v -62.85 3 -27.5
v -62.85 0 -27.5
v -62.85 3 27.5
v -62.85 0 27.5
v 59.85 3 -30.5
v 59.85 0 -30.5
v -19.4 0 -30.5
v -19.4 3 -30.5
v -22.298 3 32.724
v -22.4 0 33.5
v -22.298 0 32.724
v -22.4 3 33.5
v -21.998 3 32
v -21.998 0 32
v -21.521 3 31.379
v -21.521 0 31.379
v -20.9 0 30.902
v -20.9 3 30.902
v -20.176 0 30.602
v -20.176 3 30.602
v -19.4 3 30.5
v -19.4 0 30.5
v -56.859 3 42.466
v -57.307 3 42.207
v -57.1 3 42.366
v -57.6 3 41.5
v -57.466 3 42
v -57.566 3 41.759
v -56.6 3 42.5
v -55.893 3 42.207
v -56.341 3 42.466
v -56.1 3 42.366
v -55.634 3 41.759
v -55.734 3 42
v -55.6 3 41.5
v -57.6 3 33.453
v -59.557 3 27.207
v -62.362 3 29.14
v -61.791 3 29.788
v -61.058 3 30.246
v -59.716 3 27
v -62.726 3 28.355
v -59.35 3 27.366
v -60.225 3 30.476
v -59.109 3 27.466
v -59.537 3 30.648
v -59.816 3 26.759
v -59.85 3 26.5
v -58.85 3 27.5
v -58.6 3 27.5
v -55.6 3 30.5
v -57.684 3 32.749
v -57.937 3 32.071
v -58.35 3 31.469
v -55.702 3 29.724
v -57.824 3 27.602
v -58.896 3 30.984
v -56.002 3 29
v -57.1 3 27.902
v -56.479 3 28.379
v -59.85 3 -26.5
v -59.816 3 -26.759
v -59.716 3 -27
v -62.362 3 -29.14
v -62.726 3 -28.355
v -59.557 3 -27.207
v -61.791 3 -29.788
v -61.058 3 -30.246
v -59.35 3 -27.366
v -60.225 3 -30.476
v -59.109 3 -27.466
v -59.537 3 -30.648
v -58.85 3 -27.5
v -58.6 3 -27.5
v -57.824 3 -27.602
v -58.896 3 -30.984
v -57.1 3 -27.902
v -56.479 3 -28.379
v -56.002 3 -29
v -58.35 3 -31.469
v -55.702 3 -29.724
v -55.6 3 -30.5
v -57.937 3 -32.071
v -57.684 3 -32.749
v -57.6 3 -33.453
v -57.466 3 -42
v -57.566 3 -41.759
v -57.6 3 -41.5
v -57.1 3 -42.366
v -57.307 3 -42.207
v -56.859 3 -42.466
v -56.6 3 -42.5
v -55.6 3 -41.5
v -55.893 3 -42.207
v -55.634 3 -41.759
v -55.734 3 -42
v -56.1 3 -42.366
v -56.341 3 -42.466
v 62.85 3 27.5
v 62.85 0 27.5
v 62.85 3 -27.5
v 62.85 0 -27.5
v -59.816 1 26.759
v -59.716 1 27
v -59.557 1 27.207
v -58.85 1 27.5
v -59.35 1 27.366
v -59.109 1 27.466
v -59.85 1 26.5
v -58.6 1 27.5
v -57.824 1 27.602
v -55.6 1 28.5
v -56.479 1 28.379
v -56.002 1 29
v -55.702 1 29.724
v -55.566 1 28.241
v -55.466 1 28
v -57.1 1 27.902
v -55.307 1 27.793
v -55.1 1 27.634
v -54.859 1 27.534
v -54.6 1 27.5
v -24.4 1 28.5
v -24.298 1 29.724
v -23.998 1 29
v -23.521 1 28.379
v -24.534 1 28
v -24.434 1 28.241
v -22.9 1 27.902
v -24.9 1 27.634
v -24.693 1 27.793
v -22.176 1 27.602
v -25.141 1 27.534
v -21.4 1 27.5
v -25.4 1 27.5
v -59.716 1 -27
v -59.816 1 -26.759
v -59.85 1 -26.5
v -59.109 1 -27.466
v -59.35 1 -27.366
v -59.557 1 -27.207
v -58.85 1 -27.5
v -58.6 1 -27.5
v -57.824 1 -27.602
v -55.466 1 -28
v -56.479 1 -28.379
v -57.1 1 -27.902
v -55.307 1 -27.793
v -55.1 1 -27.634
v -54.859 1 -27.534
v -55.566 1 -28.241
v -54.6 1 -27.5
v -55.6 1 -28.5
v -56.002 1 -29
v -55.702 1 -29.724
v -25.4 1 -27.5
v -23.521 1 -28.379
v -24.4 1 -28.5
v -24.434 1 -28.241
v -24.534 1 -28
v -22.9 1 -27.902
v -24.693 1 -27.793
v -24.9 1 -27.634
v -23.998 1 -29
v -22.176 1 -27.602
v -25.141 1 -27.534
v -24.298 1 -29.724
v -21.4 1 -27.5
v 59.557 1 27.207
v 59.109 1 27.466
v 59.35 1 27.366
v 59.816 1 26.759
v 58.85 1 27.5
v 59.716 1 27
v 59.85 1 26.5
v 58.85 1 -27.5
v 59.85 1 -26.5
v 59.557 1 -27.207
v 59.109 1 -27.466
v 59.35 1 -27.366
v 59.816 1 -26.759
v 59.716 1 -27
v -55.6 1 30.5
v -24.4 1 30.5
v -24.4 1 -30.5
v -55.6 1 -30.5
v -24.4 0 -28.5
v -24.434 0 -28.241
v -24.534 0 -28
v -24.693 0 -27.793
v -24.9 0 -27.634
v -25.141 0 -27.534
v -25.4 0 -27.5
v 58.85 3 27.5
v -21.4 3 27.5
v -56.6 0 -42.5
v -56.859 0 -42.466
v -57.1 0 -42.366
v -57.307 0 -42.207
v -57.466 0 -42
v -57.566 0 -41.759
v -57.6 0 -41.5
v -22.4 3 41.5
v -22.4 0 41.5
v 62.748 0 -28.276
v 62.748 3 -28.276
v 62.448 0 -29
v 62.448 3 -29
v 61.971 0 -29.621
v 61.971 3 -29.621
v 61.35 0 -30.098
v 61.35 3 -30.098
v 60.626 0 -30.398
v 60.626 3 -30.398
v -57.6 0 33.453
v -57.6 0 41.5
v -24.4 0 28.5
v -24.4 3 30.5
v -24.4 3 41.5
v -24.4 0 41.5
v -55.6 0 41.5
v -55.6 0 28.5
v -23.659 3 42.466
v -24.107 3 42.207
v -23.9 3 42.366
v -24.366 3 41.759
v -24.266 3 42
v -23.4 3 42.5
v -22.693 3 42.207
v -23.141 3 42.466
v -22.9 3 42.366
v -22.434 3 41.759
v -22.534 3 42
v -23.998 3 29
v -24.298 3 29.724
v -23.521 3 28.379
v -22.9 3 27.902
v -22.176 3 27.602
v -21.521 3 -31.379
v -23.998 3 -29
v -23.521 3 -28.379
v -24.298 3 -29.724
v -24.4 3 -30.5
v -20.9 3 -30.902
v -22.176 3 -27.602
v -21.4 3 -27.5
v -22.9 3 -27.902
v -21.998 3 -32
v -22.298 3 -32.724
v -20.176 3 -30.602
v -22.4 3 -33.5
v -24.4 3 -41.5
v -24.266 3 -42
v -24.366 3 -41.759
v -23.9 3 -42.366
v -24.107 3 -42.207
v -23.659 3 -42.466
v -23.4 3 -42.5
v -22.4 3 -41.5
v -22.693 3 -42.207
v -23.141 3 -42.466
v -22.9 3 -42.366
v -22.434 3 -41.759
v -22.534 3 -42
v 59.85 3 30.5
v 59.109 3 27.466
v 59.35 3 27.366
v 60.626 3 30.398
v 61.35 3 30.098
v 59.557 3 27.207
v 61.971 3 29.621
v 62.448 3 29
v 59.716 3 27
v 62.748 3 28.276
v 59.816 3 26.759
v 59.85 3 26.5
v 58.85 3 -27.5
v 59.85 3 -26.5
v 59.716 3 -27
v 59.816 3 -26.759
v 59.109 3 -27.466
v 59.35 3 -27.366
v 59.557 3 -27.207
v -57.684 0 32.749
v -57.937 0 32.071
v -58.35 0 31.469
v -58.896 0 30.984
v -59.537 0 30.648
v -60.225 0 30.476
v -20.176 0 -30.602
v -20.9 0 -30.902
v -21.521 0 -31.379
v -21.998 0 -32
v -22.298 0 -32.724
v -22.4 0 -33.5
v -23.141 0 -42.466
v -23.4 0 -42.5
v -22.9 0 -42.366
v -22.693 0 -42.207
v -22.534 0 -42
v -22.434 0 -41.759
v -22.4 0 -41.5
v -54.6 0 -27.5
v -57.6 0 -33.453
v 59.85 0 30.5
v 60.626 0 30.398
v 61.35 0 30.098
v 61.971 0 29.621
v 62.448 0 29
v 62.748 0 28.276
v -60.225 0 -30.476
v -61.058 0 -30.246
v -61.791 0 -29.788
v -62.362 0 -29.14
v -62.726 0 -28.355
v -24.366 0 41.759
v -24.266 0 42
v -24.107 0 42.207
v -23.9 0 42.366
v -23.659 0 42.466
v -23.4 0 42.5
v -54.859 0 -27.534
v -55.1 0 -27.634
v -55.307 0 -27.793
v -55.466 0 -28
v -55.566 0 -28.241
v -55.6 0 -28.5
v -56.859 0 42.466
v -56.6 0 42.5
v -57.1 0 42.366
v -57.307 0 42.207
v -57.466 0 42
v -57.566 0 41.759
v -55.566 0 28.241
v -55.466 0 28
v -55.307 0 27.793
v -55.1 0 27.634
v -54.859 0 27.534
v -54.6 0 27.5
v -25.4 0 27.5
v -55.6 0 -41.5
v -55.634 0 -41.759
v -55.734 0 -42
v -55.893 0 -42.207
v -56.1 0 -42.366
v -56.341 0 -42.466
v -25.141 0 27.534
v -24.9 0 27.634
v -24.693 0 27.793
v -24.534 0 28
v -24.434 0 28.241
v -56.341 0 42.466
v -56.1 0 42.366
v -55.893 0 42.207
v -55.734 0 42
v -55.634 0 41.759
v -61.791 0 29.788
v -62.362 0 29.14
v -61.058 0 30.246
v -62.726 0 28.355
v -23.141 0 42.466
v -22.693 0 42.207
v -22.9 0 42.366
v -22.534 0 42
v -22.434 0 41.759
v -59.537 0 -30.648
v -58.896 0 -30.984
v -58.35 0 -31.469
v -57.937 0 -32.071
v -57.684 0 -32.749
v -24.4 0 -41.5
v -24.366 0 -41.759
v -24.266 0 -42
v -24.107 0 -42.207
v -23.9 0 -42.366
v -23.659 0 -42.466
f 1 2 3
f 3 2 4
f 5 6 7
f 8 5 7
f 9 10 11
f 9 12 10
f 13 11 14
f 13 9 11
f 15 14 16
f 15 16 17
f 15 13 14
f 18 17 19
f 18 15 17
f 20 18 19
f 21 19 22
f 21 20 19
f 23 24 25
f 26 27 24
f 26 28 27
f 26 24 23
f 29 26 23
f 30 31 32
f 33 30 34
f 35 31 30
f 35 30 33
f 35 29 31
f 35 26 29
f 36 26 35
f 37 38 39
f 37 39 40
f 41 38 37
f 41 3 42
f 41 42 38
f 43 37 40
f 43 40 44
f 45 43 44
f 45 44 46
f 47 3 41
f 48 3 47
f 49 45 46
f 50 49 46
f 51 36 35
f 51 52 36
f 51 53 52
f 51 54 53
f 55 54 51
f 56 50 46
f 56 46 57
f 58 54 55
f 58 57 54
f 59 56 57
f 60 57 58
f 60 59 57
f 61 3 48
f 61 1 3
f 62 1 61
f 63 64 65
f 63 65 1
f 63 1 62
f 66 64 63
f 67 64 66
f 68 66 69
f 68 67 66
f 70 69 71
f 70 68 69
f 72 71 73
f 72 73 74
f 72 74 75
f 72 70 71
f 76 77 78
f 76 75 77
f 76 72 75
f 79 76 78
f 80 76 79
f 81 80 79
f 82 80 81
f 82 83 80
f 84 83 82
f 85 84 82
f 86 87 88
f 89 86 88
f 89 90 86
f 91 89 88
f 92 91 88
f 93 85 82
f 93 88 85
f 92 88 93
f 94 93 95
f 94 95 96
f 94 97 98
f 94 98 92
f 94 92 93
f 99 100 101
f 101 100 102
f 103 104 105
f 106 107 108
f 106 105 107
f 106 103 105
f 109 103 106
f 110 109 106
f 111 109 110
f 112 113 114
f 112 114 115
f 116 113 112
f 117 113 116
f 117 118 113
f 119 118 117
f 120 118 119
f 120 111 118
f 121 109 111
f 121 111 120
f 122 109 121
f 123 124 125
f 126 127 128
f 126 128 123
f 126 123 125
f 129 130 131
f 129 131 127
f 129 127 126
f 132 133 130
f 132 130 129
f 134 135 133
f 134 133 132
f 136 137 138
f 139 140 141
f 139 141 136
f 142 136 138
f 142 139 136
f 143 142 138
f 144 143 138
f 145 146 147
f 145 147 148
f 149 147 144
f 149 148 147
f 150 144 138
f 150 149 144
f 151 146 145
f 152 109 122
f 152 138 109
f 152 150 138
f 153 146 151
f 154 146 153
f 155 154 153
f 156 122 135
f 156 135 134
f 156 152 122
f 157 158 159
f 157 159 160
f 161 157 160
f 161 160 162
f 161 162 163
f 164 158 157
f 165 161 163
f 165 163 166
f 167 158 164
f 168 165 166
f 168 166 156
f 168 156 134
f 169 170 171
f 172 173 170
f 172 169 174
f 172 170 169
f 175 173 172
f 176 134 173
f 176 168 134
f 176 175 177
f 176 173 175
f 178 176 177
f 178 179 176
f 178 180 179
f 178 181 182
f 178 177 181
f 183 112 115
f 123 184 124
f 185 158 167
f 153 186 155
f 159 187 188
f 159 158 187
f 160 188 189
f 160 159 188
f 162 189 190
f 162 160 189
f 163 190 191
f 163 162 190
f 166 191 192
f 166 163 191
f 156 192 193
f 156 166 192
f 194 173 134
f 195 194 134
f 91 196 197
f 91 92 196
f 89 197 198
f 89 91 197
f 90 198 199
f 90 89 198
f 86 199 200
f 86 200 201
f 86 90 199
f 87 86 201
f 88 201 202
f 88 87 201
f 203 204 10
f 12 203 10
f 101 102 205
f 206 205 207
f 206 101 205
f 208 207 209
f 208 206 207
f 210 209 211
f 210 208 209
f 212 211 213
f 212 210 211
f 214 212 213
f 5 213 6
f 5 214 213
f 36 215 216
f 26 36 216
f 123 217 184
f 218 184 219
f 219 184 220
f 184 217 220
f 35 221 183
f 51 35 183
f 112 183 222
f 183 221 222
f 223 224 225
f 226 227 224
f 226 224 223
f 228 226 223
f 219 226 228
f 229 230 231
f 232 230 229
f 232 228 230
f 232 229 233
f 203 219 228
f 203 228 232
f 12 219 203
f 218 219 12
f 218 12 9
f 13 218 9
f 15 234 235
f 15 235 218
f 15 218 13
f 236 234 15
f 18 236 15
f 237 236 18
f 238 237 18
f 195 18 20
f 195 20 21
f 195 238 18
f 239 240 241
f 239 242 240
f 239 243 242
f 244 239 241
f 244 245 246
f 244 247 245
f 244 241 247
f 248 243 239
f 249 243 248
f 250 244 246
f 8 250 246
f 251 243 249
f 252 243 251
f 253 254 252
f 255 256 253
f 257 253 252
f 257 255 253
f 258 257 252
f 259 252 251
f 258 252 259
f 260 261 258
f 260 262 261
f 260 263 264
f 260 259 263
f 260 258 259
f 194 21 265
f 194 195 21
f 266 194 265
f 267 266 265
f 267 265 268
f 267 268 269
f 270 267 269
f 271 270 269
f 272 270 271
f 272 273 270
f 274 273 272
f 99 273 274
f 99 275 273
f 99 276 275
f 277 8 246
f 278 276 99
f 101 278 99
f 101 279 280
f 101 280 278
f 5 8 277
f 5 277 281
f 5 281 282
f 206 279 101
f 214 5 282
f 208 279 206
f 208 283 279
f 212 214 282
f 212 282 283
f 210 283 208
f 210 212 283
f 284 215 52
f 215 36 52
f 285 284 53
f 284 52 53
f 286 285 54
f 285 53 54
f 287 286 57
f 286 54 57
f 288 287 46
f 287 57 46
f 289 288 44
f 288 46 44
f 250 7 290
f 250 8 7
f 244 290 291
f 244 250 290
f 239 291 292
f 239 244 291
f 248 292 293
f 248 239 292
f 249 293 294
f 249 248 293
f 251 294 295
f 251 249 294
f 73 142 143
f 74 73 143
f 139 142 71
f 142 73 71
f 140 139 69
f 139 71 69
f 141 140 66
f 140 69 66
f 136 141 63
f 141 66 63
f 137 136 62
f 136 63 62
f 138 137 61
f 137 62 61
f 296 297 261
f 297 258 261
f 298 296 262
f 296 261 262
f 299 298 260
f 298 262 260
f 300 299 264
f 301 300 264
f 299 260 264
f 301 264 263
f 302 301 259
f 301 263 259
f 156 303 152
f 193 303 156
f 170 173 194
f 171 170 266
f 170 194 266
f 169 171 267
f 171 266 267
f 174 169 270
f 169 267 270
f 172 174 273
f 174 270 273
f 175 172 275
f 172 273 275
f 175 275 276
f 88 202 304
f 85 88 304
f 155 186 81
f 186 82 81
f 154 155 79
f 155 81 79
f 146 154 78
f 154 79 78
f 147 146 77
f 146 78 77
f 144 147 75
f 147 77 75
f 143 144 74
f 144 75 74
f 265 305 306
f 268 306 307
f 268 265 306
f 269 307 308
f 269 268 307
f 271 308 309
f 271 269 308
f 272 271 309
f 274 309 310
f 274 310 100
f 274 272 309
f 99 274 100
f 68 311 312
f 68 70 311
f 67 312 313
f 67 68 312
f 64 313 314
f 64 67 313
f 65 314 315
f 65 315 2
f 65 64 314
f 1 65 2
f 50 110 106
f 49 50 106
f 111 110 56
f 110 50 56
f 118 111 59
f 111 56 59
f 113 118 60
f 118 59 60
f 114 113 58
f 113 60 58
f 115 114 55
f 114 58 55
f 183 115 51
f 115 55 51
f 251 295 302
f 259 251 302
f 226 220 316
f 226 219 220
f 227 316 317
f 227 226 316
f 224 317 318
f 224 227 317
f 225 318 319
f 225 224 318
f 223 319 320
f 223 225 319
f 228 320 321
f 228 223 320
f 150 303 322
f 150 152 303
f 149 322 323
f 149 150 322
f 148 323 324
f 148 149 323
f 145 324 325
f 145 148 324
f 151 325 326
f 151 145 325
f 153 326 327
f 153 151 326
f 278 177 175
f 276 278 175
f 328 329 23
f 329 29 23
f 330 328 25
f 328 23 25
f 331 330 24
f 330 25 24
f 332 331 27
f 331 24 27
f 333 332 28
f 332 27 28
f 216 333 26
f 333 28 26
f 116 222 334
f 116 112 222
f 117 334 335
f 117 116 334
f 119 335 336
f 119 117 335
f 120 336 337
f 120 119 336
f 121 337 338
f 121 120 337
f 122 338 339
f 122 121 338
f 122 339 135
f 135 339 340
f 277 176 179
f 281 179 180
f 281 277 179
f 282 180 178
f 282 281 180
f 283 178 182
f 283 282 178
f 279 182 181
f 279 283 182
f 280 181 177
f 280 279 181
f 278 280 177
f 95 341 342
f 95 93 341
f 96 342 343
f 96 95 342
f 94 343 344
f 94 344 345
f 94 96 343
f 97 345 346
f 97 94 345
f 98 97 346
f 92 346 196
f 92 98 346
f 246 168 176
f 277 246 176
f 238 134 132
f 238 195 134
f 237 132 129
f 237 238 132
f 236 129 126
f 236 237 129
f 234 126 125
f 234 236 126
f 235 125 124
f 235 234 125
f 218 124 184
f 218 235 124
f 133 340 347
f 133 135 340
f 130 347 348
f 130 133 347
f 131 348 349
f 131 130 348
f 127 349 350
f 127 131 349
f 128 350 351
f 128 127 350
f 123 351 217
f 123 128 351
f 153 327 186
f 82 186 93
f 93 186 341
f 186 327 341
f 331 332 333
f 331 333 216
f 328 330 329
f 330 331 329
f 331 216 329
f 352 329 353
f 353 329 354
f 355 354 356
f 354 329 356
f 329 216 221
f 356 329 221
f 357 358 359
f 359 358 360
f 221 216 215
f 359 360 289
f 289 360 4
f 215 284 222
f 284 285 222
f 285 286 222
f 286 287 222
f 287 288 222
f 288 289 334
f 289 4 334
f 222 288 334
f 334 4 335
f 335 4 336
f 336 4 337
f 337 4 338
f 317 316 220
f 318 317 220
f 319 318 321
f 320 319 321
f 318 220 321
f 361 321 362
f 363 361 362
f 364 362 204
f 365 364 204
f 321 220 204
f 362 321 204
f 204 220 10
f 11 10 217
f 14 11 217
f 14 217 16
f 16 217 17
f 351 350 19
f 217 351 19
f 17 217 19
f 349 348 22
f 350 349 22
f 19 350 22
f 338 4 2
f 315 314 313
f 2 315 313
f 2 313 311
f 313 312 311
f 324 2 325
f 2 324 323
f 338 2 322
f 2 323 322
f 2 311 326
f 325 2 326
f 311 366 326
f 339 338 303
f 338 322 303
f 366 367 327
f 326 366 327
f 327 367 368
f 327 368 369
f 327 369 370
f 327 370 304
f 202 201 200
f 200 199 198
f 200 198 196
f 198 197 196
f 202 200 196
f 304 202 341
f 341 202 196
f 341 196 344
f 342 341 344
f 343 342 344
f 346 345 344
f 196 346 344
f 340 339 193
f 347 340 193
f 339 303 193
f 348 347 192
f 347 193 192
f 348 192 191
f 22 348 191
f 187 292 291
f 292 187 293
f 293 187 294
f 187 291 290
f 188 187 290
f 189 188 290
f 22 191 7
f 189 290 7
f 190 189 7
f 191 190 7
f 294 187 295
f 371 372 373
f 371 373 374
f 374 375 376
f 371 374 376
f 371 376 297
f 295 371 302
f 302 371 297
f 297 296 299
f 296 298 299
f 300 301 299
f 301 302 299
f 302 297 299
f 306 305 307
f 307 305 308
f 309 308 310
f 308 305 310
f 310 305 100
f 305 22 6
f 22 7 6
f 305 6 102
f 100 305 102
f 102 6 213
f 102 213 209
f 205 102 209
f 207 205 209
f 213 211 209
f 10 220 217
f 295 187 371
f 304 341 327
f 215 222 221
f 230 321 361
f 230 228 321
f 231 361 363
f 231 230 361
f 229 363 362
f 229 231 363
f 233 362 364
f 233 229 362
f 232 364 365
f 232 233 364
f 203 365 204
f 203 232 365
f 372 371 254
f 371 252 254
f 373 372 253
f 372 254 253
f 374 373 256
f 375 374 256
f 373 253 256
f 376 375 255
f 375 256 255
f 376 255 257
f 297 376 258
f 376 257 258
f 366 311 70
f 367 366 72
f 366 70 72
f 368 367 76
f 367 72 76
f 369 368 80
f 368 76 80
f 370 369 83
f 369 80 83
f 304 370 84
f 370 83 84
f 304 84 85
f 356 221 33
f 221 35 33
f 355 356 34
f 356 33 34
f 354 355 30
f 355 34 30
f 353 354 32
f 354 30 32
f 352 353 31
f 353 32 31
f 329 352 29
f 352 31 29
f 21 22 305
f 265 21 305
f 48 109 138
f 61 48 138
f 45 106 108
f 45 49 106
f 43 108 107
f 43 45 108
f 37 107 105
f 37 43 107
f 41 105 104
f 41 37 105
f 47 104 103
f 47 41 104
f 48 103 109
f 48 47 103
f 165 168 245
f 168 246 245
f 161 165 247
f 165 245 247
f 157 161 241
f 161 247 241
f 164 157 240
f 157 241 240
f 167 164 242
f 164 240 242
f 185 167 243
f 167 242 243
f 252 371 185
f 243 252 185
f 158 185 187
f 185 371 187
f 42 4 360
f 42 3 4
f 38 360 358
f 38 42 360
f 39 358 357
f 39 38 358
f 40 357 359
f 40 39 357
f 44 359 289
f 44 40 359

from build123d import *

# Parameters (mm, degrees)
BOSS_EXTRUDE6_DEPTH   = 3
BOSS_EXTRUDE6_2_DEPTH = 3
SKETCH4_W             = 119.7
SKETCH4_H             = 55
BOSS_EXTRUDE7_DEPTH   = 1
FILLET13_R            = 3
FILLET14_R            = 1
FILLET15_R            = 1
FILLET16_R            = 3
FILLET17_R            = 3
FILLET18_R            = 1
FILLET19_R            = 3
FILLET20_R            = 1


with BuildPart() as part:
    # Sketch3 → Boss-Extrude6 (new body)
    with BuildSketch(Plane(origin=(0, 0, 0), x_dir=(1, 0, 0), z_dir=(0, 1, 0))):
        Polygon((-55.6, -27.5), (-59.85, -27.5), (-59.85, 27.5), (-55.6, 27.5), (-55.6, 42.5), (-57.6, 42.5), (-57.6, 30.5), (-62.85, 30.5), (-62.85, -30.5), (-57.6, -30.5), (-57.6, -42.5), (-55.6, -42.5), align=None)
    extrude(amount=BOSS_EXTRUDE6_DEPTH)



with BuildPart() as body_2:
    # Sketch3 → Boss-Extrude6 2 (new body)
    with BuildSketch(Plane(origin=(0, 0, 0), x_dir=(1, 0, 0), z_dir=(0, 1, 0))):
        Polygon((59.85, -27.5), (-24.4, -27.5), (-24.4, -42.5), (-22.4, -42.5), (-22.4, -30.5), (62.85, -30.5), (62.85, 30.5), (-22.4, 30.5), (-22.4, 42.5), (-24.4, 42.5), (-24.4, 27.5), (59.85, 27.5), align=None)
    extrude(amount=BOSS_EXTRUDE6_2_DEPTH)


with BuildPart() as part_1:
    add(part.part)

    add(body_2.part)  # Boss-Extrude7 merges body 2
    # Sketch4 → Boss-Extrude7 (add)
    with BuildSketch(Plane(origin=(0, 0, 0), x_dir=(1, 0, 0), z_dir=(0, 1, 0))):
        Rectangle(SKETCH4_W, SKETCH4_H)
    extrude(amount=BOSS_EXTRUDE7_DEPTH)

    # Fillet13
    fillet13_edges = [part_1.edges().sort_by_distance(p)[0] for p in [
        (-62.85, 1.5, 30.5),
        (-62.85, 1.5, -30.5),
        (62.85, 1.5, 30.5),
        (62.85, 1.5, -30.5),
    ]]
    fillet(fillet13_edges, radius=FILLET13_R)

    # Fillet14
    fillet14_edges = [part_1.edges().sort_by_distance(p)[0] for p in [
        (-59.85, 2, -27.5),
        (-59.85, 2, 27.5),
        (59.85, 2, -27.5),
        (59.85, 2, 27.5),
    ]]
    fillet(fillet14_edges, radius=FILLET14_R)

    # Fillet15
    fillet15_edges = [part_1.edges().sort_by_distance(p)[0] for p in [
        (-22.4, 1.5, 42.5),
        (-24.4, 1.5, 42.5),
        (-55.6, 1.5, 42.5),
        (-57.6, 1.5, 42.5),
        (-55.6, 1.5, -42.5),
        (-57.6, 1.5, -42.5),
        (-22.4, 1.5, -42.5),
        (-24.4, 1.5, -42.5),
    ]]
    fillet(fillet15_edges, radius=FILLET15_R - 0.0001)  # a hair under: the kernel refuses the full size

    # Fillet16
    fillet16_edges = [part_1.edges().sort_by_distance(p)[0] for p in [
        (-22.4, 1.5, -30.5),
        (-57.6, 1.5, -30.5),
        (-57.6, 1.5, 30.5),
        (-22.4, 1.5, 30.5),
    ]]
    fillet(fillet16_edges, radius=FILLET16_R)

    # Fillet17
    fillet17_edges = [part_1.edges().sort_by_distance(p)[0] for p in [
        (-55.6, 2, -27.5),
        (-24.4, 2, -27.5),
    ]]
    fillet(fillet17_edges, radius=FILLET17_R)

    # Fillet18
    fillet18_edges = [part_1.edges().sort_by_distance(p)[0] for p in [
        (-55.6, 0.5, -27.5),
        (-24.4, 0.5, -27.5),
    ]]
    fillet(fillet18_edges, radius=FILLET18_R)

    # Fillet19
    fillet19_edges = [part_1.edges().sort_by_distance(p)[0] for p in [
        (-55.6, 2, 27.5),
        (-24.4, 2, 27.5),
    ]]
    fillet(fillet19_edges, radius=FILLET19_R)

    # Fillet20
    fillet20_edges = [part_1.edges().sort_by_distance(p)[0] for p in [
        (-55.6, 0.5, 27.5),
        (-24.4, 0.5, 27.5),
    ]]
    fillet(fillet20_edges, radius=FILLET20_R)


solid = part_1.part
